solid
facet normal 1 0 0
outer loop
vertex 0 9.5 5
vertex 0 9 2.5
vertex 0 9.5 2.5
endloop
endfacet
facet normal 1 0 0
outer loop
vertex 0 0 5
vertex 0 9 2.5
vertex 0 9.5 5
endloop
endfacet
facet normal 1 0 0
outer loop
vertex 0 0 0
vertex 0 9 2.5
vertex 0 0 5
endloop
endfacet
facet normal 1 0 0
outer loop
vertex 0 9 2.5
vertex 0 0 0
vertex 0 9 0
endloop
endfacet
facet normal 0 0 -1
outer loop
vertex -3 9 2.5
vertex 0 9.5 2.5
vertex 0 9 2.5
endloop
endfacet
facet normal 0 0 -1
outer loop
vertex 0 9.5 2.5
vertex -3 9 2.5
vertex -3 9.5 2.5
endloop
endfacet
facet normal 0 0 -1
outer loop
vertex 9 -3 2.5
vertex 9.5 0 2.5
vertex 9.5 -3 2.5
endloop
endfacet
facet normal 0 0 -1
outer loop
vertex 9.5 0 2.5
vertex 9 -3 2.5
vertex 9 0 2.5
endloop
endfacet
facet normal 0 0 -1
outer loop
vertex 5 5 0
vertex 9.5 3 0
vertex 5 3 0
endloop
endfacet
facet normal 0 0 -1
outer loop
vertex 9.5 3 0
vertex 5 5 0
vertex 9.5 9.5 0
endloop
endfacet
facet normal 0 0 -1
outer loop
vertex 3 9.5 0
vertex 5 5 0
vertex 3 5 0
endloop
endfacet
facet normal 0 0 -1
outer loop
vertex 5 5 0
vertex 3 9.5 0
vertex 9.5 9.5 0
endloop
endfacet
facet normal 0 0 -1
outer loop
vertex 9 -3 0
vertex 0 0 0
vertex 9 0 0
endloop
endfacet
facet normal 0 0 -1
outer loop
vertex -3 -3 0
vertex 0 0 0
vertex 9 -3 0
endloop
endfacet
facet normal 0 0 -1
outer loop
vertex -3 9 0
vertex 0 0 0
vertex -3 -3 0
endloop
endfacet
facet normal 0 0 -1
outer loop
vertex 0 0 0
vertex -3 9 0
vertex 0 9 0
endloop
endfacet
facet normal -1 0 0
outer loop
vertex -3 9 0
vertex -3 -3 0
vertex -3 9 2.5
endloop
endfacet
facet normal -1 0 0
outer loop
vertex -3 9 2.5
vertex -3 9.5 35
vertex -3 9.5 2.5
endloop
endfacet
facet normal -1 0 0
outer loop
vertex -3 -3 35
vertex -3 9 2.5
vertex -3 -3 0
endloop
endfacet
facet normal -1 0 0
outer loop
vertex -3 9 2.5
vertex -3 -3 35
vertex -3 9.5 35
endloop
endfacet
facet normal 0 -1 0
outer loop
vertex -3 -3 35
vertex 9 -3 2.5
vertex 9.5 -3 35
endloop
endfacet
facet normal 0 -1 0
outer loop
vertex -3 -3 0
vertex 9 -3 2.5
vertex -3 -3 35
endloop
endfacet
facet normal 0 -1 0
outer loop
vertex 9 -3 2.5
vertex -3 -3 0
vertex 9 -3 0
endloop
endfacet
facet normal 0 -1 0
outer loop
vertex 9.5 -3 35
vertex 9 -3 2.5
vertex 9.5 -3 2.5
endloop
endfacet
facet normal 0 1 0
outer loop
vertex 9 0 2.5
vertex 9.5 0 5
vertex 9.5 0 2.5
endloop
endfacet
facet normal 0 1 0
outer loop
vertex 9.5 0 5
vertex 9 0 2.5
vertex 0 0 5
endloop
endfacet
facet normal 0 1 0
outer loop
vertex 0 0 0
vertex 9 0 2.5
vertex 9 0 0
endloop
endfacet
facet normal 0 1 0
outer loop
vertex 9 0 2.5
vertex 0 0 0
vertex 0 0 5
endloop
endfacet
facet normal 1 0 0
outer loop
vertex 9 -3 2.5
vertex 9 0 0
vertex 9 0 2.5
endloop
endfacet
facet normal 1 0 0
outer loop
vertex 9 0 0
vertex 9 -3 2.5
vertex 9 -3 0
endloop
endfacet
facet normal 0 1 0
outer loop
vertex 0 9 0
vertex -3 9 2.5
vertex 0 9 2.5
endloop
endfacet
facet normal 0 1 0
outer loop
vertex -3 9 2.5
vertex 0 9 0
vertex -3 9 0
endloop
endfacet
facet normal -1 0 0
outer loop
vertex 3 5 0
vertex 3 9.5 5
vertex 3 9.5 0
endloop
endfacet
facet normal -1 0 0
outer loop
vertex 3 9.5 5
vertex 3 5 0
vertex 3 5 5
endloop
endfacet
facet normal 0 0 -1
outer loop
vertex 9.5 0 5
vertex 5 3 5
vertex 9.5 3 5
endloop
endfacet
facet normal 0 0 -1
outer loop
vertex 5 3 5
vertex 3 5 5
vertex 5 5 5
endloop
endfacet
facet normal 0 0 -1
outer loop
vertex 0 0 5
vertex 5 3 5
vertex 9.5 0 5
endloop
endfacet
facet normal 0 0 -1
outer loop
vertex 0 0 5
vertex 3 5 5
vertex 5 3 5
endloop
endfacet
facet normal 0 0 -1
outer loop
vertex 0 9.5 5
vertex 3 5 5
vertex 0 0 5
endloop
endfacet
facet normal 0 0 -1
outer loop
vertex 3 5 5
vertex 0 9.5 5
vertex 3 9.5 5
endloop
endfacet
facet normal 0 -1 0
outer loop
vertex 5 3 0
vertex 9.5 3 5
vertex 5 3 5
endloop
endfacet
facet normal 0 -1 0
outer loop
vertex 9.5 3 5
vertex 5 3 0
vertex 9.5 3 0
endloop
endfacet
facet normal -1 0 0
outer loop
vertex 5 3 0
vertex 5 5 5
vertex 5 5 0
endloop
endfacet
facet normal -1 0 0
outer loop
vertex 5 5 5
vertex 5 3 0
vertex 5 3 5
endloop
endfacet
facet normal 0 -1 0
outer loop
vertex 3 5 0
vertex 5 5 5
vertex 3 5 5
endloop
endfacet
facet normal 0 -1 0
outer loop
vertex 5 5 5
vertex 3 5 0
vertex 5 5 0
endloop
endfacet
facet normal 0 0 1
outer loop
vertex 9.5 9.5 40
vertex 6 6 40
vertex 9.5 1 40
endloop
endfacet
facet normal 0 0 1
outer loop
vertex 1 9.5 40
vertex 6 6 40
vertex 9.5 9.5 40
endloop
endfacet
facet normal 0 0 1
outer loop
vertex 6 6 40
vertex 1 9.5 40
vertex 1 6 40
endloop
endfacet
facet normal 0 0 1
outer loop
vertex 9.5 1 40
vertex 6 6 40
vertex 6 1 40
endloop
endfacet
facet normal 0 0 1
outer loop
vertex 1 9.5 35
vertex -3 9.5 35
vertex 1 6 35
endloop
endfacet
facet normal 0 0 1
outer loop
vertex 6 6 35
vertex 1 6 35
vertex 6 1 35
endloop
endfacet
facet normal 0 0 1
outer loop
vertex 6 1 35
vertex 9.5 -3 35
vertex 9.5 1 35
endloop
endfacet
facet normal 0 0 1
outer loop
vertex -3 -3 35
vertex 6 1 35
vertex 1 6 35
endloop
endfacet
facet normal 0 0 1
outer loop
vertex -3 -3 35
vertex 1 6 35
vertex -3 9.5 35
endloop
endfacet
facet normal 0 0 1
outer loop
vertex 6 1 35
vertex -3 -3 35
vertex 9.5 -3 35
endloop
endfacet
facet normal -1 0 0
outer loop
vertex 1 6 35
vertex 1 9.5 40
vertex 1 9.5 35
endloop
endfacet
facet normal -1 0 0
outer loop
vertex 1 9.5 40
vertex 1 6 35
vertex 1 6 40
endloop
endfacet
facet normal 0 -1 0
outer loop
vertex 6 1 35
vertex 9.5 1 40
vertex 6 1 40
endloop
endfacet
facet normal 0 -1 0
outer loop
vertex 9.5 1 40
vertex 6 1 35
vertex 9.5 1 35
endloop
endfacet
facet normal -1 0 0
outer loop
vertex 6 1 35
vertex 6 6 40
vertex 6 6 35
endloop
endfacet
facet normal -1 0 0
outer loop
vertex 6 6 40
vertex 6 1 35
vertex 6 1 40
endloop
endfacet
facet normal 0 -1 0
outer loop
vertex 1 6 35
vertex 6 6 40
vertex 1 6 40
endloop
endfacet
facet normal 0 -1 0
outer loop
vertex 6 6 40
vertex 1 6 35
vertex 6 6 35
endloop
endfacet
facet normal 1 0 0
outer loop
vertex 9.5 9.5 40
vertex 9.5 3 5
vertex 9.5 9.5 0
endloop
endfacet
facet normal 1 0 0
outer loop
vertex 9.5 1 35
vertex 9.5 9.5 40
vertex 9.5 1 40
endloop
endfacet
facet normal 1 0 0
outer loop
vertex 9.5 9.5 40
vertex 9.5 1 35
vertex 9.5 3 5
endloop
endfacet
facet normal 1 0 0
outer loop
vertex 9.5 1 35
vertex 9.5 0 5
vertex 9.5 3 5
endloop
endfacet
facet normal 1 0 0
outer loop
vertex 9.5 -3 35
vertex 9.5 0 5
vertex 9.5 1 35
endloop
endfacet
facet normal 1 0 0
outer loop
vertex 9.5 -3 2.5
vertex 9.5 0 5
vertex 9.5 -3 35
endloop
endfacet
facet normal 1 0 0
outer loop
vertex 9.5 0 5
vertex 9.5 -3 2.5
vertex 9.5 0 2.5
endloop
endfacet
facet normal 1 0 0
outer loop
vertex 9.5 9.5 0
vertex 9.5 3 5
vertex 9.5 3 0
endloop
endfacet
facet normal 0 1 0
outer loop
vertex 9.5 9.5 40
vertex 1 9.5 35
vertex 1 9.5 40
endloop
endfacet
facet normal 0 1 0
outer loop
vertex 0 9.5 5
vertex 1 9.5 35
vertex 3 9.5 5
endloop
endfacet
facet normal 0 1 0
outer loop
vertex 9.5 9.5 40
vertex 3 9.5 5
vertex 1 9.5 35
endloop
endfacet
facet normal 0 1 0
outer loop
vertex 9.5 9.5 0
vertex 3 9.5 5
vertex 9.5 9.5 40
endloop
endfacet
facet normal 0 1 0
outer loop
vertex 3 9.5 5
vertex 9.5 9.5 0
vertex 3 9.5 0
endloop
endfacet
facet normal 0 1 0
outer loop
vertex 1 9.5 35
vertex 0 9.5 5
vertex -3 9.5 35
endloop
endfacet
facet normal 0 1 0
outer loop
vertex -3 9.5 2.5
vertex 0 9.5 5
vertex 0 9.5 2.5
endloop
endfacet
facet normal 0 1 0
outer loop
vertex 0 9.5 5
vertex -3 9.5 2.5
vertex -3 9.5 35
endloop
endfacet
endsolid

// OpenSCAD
module
basket(h = 10)
{

  diameter_main = 12.5;
  groove_height_a = 2.5;
  groove_height_b = 5;
  clamp_height = 5;
  difference()
  {
    translate([ -3, -3, 0 ]) cube([ diameter_main, diameter_main, h ]);
    translate([ -2, -2, 0 ]) union()
    {
      translate([ -1, -1, 0 ]) difference()
      {
        union()
        {
          cube([ 3, 25, groove_height_a ]);
          cube([ 25, 3, groove_height_a ]);
        };
        cube([ 12, 12, groove_height_a ]);
      };
      translate([ 2, 2, 0 ]) cube([ 3, 12, groove_height_b ]);
      translate([ 2, 2, 0 ]) cube([ 12, 3, groove_height_b ]);
      translate([ 2, 2, 0 ]) cube([ 5, 5, groove_height_b ]);
    };
    translate([ 3, 3, h - clamp_height ]) difference()
    {
      cylinder(clamp_height, diameter_main + 0.5, diameter_main + 0.5);
      translate([ -2, -2, 0 ]) difference()
      {
        cube([ 20, 20, clamp_height ]);
        cube([ 5, 5, clamp_height ]);
      }
    };
  };
}

basket(40);
